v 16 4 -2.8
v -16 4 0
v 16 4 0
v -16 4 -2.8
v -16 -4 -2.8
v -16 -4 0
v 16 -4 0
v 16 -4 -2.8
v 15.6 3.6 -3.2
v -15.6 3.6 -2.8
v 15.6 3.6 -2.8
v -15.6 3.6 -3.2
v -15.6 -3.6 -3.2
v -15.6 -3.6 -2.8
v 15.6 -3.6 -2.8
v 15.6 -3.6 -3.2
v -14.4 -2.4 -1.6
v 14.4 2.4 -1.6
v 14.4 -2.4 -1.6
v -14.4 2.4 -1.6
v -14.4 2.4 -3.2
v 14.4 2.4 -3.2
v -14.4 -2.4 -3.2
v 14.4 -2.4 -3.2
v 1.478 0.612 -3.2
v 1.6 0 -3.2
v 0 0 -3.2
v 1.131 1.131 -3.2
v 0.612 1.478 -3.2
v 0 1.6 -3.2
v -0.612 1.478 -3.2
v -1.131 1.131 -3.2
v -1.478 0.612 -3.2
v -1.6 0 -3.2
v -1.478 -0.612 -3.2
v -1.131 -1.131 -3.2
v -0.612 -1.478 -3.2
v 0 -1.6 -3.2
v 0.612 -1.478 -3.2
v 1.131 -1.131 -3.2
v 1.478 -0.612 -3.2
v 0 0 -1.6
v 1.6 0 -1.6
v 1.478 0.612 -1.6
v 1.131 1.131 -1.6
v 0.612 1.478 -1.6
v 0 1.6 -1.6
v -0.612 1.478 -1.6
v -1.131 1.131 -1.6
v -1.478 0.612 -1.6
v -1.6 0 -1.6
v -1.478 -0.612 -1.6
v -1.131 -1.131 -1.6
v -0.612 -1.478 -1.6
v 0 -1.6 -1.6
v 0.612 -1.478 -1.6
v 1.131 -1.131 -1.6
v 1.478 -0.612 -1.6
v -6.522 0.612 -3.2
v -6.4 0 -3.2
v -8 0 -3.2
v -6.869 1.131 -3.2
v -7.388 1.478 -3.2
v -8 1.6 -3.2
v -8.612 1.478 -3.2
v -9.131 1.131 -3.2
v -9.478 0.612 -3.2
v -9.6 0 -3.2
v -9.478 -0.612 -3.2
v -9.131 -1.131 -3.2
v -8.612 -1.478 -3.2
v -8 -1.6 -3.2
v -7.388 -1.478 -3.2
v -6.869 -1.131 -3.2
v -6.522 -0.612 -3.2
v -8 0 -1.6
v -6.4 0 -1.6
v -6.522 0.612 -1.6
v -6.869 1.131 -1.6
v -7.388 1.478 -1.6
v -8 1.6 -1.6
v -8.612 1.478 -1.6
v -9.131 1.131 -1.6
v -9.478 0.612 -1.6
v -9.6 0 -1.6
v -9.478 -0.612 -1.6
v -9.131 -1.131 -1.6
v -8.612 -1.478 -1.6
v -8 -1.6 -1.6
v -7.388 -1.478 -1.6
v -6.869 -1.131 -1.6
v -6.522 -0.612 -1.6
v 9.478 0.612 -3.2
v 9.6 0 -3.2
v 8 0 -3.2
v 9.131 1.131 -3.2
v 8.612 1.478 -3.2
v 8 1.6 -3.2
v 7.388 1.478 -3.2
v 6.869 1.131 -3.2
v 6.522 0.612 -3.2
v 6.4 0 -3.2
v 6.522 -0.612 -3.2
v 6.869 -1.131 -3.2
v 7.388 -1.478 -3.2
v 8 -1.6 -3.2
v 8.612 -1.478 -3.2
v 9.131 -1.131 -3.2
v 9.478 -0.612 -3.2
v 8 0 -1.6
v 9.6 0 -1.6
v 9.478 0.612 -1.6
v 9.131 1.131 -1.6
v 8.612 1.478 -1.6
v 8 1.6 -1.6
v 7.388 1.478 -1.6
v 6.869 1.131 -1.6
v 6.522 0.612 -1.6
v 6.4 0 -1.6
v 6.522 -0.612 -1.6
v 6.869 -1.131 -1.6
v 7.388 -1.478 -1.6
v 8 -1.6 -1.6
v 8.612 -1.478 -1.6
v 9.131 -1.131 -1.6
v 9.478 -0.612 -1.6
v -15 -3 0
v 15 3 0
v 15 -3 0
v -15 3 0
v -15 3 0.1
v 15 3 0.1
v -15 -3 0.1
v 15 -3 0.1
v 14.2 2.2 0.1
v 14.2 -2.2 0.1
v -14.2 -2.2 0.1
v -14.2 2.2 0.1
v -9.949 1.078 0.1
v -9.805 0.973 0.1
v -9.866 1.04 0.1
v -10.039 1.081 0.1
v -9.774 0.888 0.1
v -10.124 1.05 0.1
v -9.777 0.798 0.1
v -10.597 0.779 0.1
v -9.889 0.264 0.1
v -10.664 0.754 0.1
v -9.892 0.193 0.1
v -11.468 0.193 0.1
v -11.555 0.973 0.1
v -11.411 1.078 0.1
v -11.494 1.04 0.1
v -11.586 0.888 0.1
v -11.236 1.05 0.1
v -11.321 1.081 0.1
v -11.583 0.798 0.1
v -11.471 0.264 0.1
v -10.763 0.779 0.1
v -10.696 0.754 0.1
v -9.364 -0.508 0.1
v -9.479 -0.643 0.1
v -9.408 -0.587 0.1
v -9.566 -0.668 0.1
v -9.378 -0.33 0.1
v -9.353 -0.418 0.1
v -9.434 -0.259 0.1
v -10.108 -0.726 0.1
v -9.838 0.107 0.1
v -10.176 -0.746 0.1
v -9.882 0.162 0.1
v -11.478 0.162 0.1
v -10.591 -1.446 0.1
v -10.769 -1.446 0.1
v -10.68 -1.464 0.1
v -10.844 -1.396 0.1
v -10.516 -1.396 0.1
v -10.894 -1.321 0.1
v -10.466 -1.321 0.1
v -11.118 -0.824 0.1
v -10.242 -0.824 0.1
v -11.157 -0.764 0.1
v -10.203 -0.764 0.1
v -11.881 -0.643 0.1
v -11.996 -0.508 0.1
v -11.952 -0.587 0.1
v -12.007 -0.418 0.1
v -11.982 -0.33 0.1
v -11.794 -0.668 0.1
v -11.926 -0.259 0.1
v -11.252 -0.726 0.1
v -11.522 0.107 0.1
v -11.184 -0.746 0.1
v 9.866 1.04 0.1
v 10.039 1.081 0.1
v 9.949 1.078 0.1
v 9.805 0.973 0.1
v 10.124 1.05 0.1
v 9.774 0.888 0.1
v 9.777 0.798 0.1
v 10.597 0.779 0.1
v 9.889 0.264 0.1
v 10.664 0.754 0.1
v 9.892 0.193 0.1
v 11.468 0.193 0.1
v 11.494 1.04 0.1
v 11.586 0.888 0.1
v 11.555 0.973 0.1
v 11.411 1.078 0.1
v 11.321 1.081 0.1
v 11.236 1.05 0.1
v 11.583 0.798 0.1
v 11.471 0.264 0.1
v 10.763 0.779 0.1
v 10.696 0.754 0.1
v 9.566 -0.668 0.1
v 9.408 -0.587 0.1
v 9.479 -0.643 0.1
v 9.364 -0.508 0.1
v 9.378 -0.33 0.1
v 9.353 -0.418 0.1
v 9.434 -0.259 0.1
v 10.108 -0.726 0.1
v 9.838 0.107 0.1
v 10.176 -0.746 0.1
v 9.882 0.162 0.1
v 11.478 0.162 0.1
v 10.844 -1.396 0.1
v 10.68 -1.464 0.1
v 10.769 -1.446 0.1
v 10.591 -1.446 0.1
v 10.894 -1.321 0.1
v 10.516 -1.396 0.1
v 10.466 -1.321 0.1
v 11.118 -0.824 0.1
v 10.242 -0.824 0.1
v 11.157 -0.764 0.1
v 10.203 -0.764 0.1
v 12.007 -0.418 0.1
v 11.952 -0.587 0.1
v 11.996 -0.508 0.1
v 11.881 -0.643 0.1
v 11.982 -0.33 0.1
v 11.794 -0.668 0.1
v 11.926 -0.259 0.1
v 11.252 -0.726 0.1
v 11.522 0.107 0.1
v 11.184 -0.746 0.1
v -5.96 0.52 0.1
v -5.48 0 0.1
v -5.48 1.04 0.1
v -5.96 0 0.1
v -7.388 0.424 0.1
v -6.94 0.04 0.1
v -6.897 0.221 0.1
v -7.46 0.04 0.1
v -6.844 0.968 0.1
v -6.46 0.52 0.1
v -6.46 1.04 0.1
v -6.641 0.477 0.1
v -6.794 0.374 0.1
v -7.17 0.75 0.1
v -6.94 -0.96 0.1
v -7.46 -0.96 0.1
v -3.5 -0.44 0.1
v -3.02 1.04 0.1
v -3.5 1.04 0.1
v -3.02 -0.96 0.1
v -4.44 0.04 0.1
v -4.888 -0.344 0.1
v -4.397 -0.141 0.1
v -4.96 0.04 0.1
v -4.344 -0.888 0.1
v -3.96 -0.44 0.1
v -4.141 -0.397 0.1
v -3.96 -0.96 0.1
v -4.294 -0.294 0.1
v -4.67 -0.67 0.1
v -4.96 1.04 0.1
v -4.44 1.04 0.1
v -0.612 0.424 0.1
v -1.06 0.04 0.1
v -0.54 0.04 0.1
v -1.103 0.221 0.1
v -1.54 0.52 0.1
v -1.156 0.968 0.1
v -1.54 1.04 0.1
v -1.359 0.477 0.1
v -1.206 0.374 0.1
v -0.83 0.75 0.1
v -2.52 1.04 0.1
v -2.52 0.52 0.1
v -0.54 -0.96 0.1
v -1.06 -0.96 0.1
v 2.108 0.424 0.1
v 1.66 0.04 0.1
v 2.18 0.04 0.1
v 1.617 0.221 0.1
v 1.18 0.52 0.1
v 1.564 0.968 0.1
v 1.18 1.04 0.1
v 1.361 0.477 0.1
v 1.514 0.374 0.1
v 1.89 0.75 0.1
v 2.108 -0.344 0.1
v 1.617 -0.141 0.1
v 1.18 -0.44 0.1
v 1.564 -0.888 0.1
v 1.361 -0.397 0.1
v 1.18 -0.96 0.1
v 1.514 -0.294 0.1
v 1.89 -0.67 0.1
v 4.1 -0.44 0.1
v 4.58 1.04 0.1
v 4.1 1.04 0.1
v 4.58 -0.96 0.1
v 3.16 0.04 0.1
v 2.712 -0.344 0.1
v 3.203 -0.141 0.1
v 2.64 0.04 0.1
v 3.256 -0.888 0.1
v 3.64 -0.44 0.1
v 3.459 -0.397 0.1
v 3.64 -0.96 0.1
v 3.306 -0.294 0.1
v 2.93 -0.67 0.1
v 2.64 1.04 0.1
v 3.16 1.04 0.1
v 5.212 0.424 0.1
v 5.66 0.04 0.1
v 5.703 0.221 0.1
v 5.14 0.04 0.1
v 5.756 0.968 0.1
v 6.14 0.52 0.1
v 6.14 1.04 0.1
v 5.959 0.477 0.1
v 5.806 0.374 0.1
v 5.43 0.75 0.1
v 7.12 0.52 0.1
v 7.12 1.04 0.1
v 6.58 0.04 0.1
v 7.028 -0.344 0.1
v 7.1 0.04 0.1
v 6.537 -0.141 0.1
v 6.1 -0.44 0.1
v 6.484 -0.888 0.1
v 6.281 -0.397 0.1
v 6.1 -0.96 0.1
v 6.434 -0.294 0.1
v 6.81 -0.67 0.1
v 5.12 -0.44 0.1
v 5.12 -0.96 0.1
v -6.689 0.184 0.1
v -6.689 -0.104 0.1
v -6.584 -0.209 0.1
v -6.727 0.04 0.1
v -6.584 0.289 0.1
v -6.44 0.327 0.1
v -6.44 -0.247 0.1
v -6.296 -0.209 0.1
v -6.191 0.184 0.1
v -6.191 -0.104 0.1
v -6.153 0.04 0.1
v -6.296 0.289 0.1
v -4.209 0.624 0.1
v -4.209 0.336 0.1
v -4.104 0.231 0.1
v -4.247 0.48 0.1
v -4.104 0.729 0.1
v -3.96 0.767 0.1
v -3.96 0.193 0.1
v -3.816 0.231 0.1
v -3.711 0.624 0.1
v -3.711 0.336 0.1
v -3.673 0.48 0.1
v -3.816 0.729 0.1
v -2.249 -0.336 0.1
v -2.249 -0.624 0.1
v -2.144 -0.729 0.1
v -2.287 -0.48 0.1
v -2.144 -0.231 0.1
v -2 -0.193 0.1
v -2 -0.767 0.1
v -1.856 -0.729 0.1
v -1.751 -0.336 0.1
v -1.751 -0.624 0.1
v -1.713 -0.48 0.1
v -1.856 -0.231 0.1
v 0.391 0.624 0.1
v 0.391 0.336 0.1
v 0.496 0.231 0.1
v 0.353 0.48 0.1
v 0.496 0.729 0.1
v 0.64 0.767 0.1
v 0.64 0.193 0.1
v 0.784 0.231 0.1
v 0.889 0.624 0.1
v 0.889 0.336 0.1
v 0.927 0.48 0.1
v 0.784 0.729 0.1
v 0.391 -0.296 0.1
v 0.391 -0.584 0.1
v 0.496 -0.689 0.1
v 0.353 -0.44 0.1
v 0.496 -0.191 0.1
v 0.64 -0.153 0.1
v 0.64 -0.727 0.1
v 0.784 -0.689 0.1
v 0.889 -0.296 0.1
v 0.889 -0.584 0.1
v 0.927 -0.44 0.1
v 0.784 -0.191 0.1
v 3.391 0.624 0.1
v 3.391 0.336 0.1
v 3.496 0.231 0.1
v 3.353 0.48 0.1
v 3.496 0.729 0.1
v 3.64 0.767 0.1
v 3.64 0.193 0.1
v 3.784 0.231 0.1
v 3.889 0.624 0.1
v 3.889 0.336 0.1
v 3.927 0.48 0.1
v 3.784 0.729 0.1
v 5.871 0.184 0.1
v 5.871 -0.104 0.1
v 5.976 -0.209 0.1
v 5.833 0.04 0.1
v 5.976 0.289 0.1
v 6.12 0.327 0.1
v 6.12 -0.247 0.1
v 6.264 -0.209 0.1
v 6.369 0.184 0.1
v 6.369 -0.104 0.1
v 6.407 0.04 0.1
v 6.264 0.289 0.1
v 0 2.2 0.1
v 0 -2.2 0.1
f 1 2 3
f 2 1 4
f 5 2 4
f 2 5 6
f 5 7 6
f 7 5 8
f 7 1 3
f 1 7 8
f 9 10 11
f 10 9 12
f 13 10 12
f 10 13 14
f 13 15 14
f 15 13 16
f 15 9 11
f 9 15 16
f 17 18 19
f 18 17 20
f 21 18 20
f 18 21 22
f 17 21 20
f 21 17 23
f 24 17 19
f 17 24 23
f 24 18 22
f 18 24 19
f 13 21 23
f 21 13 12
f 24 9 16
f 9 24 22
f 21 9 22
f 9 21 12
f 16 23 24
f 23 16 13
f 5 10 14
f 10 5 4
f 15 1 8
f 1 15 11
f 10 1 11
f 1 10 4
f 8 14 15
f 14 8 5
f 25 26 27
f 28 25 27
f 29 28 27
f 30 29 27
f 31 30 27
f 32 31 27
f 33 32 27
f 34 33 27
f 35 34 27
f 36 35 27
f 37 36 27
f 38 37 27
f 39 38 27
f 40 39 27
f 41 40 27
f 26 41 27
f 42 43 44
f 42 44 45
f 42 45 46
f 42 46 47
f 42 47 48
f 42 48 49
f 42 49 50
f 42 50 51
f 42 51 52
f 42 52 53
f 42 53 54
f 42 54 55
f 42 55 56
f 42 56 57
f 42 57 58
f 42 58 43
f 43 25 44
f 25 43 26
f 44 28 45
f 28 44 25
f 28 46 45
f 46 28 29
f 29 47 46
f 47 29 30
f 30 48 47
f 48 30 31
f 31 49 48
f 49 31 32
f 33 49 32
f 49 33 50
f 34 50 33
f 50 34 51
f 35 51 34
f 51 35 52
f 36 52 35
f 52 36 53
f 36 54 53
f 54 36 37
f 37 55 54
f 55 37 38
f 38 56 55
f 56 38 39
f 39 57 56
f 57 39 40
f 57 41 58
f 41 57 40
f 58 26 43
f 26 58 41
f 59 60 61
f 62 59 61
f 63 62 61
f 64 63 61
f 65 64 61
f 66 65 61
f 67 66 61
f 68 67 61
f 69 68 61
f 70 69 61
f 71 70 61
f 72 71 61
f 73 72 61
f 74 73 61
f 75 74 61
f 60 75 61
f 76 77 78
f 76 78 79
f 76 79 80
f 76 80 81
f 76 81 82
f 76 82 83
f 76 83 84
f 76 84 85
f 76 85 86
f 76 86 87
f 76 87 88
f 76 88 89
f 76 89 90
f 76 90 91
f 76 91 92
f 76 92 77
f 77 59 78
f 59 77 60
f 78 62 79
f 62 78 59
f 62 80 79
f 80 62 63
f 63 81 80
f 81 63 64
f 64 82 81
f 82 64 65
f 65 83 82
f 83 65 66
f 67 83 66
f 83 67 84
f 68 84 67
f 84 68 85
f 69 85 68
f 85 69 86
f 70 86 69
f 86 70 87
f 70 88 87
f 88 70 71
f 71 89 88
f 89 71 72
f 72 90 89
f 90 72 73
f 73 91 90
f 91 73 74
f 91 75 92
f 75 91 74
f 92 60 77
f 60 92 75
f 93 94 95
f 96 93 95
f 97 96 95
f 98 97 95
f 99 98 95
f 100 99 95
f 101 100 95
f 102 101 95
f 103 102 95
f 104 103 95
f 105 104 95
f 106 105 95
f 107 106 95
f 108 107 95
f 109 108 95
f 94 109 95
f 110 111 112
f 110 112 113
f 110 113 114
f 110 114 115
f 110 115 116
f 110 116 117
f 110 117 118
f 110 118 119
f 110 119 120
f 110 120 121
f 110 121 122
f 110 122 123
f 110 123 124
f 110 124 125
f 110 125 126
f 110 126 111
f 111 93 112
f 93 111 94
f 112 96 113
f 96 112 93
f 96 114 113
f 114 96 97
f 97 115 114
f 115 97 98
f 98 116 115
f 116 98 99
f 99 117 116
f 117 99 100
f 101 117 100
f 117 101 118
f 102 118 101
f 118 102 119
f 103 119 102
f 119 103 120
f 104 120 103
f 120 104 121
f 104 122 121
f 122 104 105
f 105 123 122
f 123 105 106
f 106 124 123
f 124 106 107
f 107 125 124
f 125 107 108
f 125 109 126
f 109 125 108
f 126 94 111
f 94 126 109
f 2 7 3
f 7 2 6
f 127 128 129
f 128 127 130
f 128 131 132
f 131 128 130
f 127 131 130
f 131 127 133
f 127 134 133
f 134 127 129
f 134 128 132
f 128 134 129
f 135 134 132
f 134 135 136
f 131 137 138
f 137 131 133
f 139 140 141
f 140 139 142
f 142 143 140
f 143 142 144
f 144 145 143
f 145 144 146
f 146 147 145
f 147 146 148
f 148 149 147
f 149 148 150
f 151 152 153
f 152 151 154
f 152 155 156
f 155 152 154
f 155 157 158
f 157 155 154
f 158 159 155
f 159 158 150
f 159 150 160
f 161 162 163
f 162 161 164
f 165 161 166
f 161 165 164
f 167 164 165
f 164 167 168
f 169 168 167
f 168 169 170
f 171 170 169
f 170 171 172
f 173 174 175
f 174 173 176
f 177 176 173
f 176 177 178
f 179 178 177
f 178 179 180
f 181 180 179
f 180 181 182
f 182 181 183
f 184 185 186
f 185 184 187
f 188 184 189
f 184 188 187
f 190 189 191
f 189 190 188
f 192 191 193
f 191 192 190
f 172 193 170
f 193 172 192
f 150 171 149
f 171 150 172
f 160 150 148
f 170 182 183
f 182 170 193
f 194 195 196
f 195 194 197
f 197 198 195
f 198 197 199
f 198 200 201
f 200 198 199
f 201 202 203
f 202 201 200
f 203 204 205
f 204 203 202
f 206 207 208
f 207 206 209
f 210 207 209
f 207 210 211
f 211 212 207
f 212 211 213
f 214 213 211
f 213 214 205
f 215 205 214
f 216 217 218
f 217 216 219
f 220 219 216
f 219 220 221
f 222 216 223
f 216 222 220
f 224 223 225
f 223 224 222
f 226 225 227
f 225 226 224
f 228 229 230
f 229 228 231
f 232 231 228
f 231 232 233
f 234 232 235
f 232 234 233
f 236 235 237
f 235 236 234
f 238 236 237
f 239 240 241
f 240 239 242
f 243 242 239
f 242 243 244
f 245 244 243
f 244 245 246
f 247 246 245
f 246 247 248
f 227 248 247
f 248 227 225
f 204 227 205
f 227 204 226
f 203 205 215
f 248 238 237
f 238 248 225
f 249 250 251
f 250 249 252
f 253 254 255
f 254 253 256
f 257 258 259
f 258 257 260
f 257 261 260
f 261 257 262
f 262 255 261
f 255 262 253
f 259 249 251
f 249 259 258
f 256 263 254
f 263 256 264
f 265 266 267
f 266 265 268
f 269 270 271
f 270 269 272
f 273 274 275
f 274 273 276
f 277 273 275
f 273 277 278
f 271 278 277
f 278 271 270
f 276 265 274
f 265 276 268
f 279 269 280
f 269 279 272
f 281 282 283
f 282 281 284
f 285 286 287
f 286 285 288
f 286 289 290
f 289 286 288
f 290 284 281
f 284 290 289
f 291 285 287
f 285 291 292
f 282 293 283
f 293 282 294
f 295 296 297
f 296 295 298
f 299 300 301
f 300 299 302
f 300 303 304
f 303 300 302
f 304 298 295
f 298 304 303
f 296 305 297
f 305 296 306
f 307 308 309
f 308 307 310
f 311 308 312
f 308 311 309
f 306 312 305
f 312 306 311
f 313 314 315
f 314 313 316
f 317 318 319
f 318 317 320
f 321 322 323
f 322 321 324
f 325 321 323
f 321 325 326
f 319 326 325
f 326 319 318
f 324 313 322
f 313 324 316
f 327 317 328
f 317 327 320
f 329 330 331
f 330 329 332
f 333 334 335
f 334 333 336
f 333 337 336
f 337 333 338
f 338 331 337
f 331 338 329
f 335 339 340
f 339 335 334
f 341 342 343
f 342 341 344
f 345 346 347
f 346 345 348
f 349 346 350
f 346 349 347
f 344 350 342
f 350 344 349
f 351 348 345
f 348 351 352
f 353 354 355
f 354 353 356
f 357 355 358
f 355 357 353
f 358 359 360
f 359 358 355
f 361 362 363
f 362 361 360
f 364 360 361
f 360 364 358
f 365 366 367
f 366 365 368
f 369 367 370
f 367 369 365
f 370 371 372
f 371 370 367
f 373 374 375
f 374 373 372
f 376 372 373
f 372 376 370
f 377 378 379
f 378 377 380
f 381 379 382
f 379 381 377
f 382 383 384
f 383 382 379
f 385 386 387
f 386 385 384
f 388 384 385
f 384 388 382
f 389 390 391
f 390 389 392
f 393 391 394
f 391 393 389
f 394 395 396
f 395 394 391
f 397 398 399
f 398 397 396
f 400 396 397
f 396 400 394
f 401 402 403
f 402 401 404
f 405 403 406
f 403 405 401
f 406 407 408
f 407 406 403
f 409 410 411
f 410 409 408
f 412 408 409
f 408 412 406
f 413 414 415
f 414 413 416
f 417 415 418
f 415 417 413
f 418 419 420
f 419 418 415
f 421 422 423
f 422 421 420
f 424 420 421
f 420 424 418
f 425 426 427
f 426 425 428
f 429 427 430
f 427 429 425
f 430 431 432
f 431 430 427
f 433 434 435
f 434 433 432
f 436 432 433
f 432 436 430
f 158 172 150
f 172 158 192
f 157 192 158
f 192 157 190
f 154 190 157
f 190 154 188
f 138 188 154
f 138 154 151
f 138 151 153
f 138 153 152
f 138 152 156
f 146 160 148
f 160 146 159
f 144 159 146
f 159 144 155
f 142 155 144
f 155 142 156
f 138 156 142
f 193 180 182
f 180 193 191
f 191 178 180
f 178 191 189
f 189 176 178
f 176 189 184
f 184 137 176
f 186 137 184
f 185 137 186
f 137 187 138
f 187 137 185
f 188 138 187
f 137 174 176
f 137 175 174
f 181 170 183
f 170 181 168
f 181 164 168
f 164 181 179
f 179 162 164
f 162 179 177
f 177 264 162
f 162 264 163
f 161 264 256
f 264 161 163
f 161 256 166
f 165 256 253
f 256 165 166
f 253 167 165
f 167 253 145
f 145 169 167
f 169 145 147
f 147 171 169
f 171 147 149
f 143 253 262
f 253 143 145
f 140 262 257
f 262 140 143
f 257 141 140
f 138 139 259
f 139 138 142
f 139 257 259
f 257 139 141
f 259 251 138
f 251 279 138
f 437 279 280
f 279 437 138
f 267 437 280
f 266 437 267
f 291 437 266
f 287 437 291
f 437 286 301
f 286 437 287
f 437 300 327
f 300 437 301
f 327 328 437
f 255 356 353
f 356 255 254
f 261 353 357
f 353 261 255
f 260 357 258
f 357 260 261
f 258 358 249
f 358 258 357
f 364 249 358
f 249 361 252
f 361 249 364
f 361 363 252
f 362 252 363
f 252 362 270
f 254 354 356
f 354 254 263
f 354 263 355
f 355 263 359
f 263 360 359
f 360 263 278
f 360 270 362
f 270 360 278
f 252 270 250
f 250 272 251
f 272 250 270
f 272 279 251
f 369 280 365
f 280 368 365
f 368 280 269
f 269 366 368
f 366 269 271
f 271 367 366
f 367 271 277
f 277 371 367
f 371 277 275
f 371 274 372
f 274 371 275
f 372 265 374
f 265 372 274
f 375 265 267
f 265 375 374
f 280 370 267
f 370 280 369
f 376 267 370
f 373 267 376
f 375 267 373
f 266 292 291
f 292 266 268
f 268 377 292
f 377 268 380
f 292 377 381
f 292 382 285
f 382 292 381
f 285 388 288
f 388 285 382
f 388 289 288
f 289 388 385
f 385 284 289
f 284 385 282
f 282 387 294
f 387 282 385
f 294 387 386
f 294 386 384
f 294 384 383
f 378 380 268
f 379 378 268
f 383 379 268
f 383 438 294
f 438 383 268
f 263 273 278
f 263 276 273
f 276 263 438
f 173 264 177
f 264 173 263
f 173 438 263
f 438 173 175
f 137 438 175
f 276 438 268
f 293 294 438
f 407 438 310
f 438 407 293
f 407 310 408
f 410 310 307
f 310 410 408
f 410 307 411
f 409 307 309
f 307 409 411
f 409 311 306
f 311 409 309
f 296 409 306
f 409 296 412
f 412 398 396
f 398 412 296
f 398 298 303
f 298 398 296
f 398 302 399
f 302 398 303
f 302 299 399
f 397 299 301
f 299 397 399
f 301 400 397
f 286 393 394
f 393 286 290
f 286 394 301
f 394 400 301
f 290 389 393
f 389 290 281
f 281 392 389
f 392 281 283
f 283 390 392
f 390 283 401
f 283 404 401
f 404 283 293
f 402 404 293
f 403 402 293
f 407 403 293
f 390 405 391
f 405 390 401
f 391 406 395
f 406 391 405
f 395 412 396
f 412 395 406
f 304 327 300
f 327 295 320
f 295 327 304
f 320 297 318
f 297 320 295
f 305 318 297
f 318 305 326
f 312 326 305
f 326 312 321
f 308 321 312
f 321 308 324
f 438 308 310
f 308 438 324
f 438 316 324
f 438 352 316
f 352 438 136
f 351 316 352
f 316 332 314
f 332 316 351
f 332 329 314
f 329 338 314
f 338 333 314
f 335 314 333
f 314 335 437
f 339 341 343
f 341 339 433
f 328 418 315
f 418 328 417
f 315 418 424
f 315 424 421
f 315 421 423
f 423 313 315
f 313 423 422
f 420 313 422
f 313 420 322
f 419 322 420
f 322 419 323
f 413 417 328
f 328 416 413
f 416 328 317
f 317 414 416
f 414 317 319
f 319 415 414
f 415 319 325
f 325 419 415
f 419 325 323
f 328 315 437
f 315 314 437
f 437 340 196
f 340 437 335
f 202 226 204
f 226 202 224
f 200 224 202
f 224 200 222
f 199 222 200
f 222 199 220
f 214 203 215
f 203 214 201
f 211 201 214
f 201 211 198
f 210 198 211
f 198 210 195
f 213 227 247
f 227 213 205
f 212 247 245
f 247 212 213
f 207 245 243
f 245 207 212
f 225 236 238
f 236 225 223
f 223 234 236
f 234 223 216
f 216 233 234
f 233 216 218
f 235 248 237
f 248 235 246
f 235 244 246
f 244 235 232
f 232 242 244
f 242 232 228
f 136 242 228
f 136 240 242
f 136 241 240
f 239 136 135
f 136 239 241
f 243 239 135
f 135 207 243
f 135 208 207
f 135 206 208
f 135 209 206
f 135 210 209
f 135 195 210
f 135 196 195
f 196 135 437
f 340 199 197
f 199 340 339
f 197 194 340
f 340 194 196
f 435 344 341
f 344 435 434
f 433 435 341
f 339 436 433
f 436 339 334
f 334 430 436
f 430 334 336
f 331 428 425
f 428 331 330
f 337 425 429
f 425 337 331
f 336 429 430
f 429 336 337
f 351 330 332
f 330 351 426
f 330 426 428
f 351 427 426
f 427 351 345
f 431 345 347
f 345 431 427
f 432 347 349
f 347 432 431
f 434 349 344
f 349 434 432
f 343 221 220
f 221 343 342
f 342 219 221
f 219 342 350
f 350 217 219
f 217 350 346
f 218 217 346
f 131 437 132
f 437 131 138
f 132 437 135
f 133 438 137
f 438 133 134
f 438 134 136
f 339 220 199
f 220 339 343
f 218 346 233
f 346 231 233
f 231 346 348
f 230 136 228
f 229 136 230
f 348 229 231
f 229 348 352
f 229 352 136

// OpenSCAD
use <../lib.scad>
use <2431.scad>
use <6259759h.scad>
function ldraw_lib__2431d0l() = [
// 0 Tile  1 x  4 with Alien "FUNBUS" Characters, Magenta Stars and Coral Outline Sticker
// 0 Name: 2431d0l.dat
// 0 Author: Evert-Jan Boer [ejboer]
// 0 !LDRAW_ORG Shortcut UPDATE 2024-09
// 0 !LICENSE Licensed under CC BY 4.0 : see CAreadme.txt
// 
// 0 BFC CERTIFY CCW
  [0,"BFC","CERTIFY"],
  [0,"BFC","CCW"],
// 
// 0 !CATEGORY Sticker Shortcut
// 0 !KEYWORDS Bricklink 2431pb621, Set 70828
// 
// 0 !HISTORY 2024-10-27 [OrionP] Official Update 2024-09
// 
// 1 16 0 0 0 1 0 0 0 1 0 0 0 1 2431.dat
  [1,16,0,0,0,1,0,0,0,1,0,0,0,1, ldraw_lib__2431()],
// 1 16 0 0 0 1 0 0 0 1 0 0 0 1 6259759h.dat
  [1,16,0,0,0,1,0,0,0,1,0,0,0,1, ldraw_lib__6259759h()],
];
module ldraw_lib__2431d0l(step=0, col=false, unit=2/5, alt=false, line=0.2, solid=!$preview)
    makepoly(ldraw_lib__2431d0l(), step=step, col=col, unit=unit, alt=alt, line=line, solid=solid);
ldraw_lib__2431d0l(line=0.2);
